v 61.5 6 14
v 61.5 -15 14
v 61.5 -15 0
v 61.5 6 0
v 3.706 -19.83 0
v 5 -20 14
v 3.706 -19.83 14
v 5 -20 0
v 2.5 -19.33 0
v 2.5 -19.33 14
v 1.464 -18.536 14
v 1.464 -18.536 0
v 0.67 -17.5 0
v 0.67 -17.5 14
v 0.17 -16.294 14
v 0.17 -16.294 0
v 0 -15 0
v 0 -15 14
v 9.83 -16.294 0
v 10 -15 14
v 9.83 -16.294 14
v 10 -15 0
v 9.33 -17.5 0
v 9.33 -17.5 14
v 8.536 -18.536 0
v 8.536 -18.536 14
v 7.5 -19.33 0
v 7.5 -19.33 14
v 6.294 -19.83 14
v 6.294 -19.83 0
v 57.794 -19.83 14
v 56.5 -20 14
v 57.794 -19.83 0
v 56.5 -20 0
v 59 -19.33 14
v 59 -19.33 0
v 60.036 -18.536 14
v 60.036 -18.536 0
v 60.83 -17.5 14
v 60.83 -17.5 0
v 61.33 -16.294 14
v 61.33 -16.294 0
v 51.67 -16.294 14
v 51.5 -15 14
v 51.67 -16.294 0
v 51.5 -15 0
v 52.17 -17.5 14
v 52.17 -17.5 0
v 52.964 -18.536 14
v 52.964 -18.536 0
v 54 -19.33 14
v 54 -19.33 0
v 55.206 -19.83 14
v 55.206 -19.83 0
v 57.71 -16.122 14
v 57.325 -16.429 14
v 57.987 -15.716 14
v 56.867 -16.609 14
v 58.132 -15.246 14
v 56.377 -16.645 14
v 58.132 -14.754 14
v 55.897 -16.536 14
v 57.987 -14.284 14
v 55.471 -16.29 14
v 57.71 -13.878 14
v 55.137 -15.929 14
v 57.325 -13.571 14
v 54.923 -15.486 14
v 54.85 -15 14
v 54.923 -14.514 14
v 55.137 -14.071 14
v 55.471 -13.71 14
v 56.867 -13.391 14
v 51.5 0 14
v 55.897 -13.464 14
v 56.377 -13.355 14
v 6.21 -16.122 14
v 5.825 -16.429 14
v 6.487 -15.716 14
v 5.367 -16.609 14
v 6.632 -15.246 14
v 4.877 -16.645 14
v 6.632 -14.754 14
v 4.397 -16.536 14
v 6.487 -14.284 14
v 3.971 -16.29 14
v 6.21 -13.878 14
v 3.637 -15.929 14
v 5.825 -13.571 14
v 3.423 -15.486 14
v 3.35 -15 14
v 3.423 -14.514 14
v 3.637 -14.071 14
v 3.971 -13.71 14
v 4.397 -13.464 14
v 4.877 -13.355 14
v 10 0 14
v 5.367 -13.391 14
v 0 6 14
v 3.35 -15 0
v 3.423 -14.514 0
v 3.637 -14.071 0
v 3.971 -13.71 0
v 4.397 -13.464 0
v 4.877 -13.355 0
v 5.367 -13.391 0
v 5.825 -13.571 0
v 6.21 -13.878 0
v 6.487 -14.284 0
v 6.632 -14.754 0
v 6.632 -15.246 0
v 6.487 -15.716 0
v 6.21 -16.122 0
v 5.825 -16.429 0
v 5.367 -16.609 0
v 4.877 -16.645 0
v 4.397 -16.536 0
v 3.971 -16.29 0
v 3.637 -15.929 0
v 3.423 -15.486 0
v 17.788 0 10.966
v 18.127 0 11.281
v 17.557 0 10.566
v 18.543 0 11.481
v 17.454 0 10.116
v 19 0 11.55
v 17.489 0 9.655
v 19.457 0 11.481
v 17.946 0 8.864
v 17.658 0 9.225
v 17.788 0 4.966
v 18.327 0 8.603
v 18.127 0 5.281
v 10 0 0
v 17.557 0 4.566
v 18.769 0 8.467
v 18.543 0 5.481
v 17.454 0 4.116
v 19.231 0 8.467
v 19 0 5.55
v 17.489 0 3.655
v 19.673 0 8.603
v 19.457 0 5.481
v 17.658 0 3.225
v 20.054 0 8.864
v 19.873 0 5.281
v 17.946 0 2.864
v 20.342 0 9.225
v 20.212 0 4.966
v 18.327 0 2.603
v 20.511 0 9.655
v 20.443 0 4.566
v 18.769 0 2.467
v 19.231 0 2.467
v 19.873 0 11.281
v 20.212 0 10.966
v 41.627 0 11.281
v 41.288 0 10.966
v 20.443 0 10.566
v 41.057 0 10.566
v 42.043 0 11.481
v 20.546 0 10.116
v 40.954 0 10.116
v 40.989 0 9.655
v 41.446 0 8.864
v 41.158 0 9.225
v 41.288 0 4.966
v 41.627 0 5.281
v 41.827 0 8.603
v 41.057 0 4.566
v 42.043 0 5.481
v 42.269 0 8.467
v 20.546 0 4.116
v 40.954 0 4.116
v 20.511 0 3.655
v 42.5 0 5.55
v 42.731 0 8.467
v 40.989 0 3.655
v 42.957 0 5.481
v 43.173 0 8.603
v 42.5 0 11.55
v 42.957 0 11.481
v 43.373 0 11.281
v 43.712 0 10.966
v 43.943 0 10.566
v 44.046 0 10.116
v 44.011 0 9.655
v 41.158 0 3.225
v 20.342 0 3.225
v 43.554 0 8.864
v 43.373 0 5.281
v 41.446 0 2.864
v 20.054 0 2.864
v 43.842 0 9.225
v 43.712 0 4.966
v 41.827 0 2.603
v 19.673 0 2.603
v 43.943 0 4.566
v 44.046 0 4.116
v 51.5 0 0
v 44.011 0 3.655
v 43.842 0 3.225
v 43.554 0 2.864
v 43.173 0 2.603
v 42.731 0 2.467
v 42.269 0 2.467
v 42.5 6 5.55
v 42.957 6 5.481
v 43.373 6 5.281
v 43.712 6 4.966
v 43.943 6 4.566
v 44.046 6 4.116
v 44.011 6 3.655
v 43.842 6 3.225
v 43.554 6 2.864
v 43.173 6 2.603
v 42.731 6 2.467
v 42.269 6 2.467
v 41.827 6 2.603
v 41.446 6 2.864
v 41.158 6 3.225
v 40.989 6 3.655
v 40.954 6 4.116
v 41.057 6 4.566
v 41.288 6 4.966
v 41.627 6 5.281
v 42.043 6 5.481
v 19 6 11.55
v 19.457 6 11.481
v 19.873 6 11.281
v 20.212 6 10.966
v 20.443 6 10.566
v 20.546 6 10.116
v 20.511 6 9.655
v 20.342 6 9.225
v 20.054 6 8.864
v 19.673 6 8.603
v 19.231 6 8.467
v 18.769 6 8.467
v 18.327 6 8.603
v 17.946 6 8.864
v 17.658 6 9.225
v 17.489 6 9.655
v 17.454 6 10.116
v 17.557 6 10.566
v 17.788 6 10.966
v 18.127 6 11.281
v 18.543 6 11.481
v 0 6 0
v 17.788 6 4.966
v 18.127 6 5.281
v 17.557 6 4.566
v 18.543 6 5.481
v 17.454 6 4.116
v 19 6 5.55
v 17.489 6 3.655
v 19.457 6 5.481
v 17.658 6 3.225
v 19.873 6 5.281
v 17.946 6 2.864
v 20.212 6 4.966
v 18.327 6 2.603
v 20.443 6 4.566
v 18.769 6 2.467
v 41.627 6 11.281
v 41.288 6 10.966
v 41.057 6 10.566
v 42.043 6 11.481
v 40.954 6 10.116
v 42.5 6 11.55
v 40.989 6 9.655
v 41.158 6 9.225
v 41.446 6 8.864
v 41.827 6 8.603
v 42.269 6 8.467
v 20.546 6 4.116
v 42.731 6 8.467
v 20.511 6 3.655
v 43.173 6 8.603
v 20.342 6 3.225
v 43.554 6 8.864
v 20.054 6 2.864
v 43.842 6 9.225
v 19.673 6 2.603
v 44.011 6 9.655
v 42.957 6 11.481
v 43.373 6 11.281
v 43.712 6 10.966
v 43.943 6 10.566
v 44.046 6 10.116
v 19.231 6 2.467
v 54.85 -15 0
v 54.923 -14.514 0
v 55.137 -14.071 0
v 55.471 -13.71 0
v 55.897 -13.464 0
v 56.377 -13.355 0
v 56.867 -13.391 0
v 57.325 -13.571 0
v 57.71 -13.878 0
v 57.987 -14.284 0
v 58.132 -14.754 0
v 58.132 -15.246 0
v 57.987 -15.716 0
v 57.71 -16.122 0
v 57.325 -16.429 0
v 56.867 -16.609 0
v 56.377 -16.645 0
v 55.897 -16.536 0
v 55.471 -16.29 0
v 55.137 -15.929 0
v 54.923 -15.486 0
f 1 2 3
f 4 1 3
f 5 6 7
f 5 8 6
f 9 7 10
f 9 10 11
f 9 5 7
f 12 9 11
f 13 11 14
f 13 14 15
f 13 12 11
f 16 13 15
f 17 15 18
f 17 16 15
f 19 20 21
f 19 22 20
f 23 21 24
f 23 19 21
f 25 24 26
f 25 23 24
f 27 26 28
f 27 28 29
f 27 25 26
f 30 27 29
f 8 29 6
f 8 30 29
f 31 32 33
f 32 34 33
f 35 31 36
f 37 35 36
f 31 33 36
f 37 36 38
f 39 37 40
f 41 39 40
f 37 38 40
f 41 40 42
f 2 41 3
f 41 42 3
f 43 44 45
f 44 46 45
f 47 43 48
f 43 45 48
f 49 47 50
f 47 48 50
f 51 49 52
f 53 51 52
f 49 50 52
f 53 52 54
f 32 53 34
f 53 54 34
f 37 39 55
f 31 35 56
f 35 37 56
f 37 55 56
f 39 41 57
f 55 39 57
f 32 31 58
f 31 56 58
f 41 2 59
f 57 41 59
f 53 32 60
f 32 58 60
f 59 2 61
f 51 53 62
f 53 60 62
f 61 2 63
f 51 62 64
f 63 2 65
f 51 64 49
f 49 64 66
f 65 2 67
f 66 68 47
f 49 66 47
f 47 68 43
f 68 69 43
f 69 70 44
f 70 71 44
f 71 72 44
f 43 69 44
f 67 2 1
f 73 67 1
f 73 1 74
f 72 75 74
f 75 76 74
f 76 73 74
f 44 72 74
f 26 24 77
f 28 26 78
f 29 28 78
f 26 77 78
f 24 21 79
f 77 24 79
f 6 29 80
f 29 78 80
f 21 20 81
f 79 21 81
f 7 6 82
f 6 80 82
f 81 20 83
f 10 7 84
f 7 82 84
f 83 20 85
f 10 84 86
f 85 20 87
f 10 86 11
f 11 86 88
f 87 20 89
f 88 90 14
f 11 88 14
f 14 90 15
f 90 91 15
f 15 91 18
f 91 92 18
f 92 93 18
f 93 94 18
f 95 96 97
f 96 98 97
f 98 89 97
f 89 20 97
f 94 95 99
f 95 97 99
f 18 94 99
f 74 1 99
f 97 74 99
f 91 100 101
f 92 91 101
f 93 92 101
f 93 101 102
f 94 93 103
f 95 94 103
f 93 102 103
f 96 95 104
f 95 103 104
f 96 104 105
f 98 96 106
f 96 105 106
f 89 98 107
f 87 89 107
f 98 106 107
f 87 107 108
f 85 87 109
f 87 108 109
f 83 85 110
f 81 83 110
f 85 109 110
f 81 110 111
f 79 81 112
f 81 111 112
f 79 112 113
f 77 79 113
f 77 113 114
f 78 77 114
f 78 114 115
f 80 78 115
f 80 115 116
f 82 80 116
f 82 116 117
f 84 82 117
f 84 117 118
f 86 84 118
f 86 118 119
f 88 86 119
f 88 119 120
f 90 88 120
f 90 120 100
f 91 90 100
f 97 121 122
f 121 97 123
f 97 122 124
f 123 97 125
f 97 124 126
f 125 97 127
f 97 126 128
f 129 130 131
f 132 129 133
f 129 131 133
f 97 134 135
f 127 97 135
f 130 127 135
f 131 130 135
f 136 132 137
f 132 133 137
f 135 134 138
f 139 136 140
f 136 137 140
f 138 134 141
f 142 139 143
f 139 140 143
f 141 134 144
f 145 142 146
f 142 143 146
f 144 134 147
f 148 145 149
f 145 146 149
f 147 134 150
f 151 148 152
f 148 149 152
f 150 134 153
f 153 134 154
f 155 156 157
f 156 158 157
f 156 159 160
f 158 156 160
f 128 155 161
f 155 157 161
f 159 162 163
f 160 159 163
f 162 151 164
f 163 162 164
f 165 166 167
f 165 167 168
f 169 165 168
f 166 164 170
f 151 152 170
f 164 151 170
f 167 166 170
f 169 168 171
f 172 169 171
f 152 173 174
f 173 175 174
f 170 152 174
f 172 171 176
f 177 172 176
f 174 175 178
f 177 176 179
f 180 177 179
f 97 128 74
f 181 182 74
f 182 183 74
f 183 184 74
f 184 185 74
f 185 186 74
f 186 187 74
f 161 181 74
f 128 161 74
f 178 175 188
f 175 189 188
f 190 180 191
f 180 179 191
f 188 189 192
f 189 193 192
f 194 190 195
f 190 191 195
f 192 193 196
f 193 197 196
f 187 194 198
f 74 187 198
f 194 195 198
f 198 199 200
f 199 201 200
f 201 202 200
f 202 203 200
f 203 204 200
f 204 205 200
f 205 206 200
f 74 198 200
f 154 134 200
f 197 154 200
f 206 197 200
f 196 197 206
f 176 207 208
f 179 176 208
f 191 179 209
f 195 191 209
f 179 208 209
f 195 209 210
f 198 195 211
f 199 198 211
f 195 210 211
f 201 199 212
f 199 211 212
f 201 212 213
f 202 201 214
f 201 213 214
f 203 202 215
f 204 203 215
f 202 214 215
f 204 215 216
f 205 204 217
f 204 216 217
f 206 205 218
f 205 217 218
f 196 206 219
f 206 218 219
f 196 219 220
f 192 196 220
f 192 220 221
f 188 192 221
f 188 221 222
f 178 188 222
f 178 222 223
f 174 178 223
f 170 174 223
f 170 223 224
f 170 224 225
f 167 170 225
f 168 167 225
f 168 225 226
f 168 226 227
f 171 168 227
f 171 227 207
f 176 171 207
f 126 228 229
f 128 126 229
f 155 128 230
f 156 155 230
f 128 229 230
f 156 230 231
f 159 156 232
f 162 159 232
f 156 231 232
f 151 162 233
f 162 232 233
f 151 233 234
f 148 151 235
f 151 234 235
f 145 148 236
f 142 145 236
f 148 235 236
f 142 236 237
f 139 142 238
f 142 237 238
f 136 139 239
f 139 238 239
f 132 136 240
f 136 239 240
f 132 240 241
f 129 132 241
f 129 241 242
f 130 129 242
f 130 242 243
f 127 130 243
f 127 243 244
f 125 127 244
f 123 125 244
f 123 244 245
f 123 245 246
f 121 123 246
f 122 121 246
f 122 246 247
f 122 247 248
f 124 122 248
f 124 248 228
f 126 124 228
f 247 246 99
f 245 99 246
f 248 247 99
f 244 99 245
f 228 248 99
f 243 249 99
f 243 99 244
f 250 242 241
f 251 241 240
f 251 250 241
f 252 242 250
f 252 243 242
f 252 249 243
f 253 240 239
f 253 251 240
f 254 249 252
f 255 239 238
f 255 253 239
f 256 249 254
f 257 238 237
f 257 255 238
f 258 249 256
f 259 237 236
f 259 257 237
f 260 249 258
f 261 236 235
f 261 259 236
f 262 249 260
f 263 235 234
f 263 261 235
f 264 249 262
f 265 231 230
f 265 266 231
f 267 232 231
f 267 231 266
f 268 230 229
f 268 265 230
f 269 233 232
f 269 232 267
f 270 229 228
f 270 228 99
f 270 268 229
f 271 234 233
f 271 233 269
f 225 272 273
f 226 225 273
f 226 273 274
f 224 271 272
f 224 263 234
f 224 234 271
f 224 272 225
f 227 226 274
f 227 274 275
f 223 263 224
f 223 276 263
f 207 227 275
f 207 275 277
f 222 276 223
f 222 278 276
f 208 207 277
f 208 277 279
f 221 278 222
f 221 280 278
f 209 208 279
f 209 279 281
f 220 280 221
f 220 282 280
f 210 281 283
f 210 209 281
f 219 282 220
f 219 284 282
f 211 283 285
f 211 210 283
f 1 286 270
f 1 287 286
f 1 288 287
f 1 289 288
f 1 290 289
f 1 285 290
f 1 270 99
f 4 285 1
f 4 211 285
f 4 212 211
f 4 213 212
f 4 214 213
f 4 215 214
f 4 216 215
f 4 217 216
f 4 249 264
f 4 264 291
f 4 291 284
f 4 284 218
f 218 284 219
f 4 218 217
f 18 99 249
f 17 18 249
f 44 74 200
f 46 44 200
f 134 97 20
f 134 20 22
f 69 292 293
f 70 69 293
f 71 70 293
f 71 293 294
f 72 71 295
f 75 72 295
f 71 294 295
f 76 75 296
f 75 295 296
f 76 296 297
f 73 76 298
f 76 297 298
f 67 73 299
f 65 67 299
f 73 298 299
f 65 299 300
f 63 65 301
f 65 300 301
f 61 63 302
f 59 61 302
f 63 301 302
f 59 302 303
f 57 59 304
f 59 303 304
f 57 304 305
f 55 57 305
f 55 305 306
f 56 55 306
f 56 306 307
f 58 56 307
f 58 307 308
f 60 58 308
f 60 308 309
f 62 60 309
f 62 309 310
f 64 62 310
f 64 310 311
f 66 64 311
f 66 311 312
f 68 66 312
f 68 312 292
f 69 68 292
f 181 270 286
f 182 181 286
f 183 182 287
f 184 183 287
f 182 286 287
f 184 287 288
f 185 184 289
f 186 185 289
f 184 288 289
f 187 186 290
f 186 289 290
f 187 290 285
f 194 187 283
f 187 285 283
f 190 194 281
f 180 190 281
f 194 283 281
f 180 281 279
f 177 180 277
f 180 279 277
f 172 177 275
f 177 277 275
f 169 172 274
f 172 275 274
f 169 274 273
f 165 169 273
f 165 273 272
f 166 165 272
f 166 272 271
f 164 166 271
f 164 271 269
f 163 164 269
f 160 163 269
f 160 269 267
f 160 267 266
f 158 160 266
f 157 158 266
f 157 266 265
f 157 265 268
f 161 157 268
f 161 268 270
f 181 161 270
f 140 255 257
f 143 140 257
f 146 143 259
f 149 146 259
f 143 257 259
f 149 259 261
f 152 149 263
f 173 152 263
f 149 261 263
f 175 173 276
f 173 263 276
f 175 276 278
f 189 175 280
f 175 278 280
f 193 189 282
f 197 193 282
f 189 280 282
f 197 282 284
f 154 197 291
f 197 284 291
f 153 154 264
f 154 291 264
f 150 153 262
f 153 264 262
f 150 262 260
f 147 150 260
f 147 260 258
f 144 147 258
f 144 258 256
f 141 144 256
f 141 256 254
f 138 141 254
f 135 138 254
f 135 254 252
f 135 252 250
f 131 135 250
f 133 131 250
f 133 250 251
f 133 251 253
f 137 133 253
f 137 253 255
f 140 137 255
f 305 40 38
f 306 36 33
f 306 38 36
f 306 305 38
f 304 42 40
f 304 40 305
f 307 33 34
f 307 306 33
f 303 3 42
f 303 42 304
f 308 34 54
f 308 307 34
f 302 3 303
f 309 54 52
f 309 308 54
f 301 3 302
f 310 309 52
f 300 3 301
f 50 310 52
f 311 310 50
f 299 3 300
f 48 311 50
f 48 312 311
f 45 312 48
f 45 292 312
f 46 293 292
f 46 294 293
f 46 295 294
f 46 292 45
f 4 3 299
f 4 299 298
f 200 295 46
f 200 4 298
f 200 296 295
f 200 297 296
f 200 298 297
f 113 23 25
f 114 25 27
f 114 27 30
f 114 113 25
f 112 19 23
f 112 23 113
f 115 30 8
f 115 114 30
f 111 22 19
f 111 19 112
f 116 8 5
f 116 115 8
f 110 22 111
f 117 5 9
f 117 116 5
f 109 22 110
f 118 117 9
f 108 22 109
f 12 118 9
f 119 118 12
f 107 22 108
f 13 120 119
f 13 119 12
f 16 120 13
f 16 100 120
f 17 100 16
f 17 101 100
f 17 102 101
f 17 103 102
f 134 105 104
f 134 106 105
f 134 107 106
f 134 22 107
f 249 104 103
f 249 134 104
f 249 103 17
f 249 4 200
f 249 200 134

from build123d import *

# Parameters (mm, degrees)
SKETCH1_W           = 61.5
SKETCH1_H           = 14
BOSS_EXTRUDE1_DEPTH = 6
SKETCH2_R           = 1.55
CUT_EXTRUDE1_DEPTH  = 64.358109189
SKETCH3_W           = 10
SKETCH3_H           = 14
BOSS_EXTRUDE2_DEPTH = 20
SKETCH4_R           = 1.65
CUT_EXTRUDE2_DEPTH  = 67.168345906
FILLET1_R           = 5


with BuildPart() as part:
    # Sketch1 → Boss-Extrude1 (new body)
    with BuildSketch(Plane(origin=(0, 0, 0), x_dir=(1, 0, 0), z_dir=(0, 1, 0))):
        with Locations((30.75, -7)):
            Rectangle(SKETCH1_W, SKETCH1_H)
    extrude(amount=BOSS_EXTRUDE1_DEPTH)

    # Sketch2 → Cut-Extrude1 (cut, through all)
    with BuildSketch(Plane(origin=(0, 6, 0), x_dir=(1, 0, 0), z_dir=(0, 1, 0))):
        with Locations(Location((19, -4, 0), (0, 0, 270))):
            Circle(SKETCH2_R)
        with Locations(Location((42.5, -4, 0), (0, 0, 270))):
            Circle(SKETCH2_R)
        with Locations(Location((19, -10, 0), (0, 0, 270))):
            Circle(SKETCH2_R)
        with Locations(Location((42.5, -10, 0), (0, 0, 270))):
            Circle(SKETCH2_R)
    extrude(amount=-CUT_EXTRUDE1_DEPTH, mode=Mode.SUBTRACT)

    # Sketch3 → Boss-Extrude2 (add)
    with BuildSketch(Plane(origin=(0, 0, 0), x_dir=(-1, 0, 0), z_dir=(0, -1, 0))):
        with Locations((-5, -7)):
            Rectangle(SKETCH3_W, SKETCH3_H)
        with Locations((-56.5, -7)):
            Rectangle(SKETCH3_W, SKETCH3_H)
    extrude(amount=BOSS_EXTRUDE2_DEPTH)

    # Sketch4 → Cut-Extrude2 (cut, through all)
    with BuildSketch(Plane(origin=(0, 0, 0), x_dir=(-1, 0, 0), z_dir=(0, 0, -1))):
        with Locations((-5, -15)):
            Circle(SKETCH4_R)
        with Locations((-56.5, -15)):
            Circle(SKETCH4_R)
    extrude(amount=-CUT_EXTRUDE2_DEPTH, mode=Mode.SUBTRACT)

    # Fillet1
    fillet1_edges = [part.edges().sort_by_distance(p)[0] for p in [
        (10, -20, 7),
        (0, -20, 7),
        (51.5, -20, 7),
        (61.5, -20, 7),
    ]]
    fillet(fillet1_edges, radius=FILLET1_R - 0.0001)  # a hair under: the kernel refuses the full size


solid = part.part
